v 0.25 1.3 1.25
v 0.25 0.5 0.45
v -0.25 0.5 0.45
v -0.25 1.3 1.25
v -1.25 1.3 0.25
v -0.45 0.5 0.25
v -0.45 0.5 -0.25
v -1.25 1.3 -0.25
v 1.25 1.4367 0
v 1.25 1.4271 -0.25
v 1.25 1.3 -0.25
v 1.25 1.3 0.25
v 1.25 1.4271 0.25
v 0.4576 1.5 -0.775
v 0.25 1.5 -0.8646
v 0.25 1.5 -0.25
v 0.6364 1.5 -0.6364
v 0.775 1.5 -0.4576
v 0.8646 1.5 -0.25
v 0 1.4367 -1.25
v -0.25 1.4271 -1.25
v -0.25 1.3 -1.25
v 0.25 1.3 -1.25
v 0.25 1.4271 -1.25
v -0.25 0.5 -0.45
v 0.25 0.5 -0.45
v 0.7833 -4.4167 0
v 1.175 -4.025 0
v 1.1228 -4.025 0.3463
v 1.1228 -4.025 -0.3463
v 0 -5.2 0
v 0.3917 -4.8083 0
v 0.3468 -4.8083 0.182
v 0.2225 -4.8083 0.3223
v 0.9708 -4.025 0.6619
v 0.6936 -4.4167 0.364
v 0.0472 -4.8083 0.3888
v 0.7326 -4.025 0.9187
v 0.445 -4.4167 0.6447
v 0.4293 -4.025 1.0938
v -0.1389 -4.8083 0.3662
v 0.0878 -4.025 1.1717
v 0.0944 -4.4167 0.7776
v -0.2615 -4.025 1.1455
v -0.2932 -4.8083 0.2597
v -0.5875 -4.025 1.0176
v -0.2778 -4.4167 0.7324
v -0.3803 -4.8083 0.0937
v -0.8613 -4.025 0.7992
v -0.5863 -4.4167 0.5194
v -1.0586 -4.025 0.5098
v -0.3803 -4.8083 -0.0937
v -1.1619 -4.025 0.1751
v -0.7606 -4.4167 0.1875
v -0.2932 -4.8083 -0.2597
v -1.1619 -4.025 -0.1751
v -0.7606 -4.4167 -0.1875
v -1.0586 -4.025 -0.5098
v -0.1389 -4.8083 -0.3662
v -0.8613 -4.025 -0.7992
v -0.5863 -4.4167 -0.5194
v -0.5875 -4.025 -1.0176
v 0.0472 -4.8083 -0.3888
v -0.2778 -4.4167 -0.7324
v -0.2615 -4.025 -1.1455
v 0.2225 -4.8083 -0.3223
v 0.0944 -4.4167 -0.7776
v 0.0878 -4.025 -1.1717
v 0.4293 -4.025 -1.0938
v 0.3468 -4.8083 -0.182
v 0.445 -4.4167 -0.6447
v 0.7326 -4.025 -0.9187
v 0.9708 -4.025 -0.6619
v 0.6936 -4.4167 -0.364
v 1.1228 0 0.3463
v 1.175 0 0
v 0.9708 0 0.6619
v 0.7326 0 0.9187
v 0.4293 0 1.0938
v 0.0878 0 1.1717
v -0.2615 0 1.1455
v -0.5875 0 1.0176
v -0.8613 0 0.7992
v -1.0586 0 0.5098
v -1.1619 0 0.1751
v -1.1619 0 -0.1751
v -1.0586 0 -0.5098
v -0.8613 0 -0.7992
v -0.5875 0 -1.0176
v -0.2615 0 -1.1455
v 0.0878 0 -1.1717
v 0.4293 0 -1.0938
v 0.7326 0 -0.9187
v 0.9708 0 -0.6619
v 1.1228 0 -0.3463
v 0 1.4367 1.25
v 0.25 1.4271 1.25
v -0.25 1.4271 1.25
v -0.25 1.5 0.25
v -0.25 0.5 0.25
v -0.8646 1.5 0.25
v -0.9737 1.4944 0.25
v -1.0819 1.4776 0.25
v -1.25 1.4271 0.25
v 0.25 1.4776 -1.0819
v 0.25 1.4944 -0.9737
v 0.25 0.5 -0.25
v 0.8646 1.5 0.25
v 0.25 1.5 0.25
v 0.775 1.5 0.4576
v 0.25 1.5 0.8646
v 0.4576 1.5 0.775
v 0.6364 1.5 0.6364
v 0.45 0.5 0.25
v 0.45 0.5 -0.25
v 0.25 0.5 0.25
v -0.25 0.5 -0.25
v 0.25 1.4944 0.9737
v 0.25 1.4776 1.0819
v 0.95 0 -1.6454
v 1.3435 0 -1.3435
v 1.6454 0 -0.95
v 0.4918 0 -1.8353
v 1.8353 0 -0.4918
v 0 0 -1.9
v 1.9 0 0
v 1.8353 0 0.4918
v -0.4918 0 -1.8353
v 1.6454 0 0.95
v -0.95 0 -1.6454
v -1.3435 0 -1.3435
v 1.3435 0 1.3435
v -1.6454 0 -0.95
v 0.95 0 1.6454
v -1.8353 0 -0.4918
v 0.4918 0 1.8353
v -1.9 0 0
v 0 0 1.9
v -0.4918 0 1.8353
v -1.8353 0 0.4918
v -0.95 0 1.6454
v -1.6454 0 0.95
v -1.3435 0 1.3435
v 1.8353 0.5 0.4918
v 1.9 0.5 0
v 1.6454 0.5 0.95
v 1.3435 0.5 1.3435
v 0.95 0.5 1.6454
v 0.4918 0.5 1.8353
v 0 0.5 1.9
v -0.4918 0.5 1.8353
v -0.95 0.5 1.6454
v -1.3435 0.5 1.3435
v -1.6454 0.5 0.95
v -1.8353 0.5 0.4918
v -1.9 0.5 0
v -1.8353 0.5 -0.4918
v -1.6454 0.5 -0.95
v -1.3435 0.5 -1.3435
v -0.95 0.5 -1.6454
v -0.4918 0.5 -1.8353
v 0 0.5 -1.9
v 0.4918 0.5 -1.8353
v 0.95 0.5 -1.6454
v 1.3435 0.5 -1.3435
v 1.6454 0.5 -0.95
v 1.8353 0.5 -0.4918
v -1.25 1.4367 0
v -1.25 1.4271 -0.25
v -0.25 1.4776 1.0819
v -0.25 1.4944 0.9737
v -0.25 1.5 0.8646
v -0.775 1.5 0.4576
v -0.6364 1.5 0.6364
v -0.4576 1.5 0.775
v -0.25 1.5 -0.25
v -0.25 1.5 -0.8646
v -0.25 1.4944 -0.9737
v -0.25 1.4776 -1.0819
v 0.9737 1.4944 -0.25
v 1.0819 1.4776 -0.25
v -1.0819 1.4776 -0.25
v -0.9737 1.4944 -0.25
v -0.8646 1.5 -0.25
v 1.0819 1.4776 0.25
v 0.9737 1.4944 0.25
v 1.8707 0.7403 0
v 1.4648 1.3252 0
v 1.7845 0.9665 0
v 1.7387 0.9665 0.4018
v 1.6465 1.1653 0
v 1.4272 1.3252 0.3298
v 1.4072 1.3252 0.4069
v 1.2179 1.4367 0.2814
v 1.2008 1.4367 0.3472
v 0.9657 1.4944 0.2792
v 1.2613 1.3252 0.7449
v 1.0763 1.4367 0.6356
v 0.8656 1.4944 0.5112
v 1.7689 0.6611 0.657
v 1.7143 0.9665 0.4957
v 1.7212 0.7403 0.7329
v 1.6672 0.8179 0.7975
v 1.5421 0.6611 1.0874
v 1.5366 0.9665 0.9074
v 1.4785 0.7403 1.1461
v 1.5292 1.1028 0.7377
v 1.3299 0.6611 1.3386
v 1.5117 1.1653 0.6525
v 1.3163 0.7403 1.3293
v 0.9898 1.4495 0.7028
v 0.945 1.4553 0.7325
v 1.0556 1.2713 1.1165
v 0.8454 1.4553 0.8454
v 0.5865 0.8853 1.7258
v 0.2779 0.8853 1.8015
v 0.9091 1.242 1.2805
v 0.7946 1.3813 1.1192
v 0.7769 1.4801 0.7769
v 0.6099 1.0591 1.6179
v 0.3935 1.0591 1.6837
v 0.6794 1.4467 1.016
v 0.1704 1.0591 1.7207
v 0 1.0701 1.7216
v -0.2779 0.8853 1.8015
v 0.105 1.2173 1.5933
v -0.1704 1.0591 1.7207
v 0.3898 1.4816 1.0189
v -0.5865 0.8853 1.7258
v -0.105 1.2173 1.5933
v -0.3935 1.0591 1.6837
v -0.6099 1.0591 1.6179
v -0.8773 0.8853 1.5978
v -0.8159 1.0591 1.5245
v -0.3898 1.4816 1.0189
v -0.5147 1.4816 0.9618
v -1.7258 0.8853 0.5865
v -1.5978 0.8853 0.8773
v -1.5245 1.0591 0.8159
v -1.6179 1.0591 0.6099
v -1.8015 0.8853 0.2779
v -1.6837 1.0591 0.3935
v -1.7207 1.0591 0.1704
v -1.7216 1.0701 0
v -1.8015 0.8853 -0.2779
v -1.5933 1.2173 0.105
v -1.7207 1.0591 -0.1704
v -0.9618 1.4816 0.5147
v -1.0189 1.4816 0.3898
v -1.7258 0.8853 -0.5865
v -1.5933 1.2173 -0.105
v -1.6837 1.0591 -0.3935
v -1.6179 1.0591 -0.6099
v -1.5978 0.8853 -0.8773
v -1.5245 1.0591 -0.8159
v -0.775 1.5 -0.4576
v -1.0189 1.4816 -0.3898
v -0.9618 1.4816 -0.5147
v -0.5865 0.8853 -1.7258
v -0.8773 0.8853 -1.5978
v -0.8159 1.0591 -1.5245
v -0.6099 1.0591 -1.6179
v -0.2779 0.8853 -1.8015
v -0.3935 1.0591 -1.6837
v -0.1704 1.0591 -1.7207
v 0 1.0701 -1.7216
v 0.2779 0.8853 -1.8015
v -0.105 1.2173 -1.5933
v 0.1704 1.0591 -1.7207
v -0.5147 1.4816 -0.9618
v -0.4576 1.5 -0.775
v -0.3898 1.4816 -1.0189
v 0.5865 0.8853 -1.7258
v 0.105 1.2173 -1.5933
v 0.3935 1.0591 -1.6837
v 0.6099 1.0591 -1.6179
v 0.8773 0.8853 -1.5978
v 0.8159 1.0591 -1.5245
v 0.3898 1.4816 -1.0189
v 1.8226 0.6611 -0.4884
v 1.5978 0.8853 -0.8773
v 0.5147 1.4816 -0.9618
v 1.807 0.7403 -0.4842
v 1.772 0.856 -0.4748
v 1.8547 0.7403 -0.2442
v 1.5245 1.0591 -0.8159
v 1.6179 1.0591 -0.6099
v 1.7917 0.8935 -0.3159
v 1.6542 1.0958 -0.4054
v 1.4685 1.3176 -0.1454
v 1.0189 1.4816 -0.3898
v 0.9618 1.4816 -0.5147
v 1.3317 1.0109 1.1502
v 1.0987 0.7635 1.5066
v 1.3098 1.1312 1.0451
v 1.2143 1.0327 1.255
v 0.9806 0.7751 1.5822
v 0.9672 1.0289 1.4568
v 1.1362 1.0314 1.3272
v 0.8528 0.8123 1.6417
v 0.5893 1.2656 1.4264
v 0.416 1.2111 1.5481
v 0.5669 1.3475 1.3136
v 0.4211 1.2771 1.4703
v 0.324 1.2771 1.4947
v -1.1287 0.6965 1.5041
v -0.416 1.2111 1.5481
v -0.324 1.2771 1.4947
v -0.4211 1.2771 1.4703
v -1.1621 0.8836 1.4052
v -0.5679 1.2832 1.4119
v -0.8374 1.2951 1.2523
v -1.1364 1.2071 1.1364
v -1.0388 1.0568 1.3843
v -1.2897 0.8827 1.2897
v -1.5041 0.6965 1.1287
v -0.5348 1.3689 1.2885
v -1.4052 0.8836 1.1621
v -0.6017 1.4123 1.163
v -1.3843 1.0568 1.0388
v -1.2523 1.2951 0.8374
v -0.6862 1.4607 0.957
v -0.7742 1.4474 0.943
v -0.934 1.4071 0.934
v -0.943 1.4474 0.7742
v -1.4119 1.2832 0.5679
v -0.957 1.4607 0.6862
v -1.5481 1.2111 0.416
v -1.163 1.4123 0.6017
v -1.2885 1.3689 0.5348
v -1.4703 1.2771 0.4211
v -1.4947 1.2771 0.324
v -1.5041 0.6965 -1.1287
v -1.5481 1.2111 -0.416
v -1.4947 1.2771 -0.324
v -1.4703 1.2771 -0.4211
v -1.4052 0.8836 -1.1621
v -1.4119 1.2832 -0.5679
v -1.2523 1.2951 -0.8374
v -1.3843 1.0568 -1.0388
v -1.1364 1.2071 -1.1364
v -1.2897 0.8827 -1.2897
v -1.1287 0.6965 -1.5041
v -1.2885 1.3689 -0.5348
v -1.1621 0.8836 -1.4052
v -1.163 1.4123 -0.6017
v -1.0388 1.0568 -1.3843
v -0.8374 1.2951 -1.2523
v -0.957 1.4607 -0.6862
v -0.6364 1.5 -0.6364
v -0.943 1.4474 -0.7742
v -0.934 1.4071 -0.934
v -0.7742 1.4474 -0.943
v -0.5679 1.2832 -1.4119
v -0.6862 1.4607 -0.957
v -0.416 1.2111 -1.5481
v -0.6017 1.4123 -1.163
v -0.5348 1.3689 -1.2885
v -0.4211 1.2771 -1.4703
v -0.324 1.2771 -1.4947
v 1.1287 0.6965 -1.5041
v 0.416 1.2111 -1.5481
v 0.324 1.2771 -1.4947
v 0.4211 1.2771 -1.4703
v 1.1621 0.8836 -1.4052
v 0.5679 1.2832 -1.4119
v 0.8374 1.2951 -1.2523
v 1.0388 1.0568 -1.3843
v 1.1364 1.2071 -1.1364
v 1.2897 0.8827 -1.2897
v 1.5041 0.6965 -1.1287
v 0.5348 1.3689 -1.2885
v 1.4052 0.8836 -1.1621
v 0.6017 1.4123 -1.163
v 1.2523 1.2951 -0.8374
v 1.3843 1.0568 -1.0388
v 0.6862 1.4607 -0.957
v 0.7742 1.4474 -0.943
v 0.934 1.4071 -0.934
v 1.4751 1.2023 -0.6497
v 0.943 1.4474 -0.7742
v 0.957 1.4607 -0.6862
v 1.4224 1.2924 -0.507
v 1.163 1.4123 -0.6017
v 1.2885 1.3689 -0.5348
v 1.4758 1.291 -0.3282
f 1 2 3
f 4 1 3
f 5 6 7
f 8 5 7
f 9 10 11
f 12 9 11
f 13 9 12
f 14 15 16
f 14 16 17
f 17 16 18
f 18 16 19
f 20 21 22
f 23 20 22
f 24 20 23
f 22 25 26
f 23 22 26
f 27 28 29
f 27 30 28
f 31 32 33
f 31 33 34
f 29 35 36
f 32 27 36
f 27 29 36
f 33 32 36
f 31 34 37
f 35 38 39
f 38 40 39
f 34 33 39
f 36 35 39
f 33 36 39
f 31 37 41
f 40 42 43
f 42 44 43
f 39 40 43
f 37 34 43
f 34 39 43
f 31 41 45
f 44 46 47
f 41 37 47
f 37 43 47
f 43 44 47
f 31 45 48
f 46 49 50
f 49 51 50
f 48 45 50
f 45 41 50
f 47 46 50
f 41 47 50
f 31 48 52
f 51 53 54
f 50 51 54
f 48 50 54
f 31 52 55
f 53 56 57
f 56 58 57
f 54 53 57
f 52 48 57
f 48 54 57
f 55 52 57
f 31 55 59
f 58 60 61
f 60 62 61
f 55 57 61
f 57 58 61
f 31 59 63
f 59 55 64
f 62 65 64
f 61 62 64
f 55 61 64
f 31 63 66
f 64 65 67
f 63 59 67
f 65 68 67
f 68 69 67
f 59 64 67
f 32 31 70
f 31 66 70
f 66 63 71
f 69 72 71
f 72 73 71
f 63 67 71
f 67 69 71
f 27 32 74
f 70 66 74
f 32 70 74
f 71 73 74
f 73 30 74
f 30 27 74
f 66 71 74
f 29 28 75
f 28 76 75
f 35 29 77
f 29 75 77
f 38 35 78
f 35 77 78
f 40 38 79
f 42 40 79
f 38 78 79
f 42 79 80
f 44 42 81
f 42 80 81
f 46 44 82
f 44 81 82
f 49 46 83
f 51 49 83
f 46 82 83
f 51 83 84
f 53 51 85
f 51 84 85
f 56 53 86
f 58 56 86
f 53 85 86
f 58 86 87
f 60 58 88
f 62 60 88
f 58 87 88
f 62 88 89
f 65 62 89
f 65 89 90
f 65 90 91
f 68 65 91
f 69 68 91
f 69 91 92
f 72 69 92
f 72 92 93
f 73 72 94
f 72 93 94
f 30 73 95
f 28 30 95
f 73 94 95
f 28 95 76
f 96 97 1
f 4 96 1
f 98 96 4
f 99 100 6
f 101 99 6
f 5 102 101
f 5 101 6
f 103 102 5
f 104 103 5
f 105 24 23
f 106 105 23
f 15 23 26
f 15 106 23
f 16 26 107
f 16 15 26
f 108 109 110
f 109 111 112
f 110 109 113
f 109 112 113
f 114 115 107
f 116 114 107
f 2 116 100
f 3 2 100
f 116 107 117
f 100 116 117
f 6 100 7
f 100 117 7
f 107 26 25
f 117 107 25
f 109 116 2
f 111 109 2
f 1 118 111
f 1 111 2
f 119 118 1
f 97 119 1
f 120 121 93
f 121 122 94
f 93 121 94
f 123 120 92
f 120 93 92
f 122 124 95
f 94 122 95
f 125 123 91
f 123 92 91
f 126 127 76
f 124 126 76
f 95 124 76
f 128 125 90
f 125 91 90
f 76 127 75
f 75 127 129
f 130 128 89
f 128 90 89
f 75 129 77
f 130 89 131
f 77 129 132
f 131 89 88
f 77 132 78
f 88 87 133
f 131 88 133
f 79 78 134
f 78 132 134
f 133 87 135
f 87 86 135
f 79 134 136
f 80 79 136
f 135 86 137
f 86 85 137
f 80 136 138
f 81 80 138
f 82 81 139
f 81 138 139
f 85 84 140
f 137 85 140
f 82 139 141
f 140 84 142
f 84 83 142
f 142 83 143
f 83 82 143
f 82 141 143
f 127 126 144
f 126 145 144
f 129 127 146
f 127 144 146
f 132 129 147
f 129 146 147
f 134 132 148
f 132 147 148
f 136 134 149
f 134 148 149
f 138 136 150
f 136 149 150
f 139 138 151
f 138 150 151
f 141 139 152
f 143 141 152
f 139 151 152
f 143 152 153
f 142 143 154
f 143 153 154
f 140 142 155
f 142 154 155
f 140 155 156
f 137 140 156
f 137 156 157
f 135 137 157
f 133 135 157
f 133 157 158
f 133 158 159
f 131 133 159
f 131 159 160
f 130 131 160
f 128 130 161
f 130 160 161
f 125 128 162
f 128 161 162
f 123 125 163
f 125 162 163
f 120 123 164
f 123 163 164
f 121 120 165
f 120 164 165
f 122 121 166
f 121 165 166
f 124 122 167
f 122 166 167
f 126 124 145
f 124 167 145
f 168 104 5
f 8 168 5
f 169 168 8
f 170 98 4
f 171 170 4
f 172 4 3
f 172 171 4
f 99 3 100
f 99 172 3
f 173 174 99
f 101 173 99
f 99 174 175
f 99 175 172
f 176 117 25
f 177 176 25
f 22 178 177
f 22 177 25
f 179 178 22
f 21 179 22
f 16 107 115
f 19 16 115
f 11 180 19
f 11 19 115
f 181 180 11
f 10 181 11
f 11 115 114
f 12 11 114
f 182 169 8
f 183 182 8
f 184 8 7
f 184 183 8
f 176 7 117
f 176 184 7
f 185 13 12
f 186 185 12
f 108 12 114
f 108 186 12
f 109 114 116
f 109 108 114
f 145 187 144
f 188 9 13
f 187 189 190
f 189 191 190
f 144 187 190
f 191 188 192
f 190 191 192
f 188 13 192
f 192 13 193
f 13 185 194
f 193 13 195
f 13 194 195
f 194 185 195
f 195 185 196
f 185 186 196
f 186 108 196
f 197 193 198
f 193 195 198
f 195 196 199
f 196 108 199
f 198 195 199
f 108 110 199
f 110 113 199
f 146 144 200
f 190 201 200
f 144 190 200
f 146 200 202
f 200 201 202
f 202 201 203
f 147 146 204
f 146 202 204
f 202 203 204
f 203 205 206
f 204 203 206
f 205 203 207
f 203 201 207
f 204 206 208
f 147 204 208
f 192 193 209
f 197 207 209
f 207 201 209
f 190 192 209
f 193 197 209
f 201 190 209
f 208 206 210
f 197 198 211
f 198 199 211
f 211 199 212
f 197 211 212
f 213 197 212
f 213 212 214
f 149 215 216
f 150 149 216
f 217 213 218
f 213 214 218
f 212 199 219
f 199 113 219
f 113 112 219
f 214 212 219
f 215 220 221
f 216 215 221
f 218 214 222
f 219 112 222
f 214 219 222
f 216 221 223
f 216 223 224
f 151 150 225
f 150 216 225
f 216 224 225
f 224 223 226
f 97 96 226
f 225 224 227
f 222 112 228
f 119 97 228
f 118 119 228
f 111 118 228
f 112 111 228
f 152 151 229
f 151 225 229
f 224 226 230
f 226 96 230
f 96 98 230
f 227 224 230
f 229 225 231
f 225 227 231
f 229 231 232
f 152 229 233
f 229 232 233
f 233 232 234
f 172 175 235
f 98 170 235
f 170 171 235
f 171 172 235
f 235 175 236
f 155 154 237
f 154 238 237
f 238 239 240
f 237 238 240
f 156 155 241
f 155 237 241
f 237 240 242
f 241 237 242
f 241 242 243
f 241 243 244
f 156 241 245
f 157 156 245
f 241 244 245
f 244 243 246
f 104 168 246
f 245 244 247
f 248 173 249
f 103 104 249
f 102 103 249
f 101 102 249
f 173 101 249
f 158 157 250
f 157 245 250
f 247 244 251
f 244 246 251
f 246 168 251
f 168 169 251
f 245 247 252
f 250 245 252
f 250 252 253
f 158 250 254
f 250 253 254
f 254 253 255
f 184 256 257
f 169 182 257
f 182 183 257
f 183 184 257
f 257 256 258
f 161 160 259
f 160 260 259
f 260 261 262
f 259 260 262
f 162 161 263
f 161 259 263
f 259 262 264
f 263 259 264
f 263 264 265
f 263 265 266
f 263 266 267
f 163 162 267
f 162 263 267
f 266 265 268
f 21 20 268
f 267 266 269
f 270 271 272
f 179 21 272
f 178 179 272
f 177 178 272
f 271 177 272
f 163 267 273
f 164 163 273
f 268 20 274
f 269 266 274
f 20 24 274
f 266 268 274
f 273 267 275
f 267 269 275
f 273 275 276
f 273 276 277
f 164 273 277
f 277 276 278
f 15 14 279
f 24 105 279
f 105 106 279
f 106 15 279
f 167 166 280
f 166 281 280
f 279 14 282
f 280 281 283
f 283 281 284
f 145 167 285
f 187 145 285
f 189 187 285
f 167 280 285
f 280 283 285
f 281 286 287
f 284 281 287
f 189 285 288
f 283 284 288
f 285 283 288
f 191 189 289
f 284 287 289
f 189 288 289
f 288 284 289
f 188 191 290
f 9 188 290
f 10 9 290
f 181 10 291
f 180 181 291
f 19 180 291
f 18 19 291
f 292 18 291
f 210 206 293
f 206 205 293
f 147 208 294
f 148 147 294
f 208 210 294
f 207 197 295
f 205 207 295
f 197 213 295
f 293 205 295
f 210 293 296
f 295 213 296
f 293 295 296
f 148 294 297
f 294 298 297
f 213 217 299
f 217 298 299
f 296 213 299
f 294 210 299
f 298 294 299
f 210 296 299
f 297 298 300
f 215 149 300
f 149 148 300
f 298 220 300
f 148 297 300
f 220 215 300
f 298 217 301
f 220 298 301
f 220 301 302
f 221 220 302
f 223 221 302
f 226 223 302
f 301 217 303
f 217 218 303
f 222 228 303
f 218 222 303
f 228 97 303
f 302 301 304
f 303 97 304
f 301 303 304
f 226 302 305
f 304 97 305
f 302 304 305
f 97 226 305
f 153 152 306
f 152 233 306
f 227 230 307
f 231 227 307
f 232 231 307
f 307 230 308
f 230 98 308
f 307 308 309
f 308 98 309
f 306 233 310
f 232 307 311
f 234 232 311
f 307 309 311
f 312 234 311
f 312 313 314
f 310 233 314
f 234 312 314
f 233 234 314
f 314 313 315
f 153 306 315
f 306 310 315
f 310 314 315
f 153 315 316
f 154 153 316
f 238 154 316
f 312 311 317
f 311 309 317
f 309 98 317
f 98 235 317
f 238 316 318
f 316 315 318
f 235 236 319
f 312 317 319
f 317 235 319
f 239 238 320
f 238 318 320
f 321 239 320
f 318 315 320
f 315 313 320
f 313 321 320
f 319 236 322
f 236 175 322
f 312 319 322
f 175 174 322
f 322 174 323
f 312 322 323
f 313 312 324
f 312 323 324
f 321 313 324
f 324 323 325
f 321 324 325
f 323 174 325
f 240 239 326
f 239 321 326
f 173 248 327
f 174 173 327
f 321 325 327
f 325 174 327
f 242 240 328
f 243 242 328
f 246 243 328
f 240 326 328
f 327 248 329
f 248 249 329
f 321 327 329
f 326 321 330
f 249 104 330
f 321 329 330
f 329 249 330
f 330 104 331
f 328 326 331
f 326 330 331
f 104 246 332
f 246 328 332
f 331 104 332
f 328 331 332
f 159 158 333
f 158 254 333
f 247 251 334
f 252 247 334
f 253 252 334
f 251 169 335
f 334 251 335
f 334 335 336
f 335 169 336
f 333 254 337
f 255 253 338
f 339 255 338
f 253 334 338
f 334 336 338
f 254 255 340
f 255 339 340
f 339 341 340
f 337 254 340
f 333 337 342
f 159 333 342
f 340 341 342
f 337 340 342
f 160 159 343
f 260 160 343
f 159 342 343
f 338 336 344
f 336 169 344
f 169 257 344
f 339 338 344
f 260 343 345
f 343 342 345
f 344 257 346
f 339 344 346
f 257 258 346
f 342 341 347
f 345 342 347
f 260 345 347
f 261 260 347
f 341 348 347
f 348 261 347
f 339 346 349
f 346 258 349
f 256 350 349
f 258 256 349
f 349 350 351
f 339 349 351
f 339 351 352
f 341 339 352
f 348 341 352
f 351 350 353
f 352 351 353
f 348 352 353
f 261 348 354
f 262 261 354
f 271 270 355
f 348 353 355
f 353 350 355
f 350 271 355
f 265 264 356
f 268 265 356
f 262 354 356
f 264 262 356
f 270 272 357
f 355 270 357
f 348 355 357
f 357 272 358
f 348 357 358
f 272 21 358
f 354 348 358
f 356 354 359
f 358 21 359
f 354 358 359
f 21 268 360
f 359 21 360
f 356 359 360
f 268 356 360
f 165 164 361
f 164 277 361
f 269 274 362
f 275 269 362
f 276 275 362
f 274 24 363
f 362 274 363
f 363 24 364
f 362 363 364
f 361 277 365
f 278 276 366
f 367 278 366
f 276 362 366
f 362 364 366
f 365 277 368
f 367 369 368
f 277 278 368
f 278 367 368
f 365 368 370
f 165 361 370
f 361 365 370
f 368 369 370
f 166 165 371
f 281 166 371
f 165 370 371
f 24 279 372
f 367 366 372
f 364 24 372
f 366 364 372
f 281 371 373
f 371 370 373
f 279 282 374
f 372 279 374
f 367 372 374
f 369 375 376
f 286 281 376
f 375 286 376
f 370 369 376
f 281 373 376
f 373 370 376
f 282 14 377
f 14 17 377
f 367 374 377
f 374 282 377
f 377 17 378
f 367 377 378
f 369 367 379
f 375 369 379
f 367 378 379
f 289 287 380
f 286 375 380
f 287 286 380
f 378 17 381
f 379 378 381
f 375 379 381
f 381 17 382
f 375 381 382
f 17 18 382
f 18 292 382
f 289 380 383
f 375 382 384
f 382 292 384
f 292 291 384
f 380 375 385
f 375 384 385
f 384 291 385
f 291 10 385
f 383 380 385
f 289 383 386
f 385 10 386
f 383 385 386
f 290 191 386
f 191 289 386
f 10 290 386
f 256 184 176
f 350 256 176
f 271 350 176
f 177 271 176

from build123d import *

# Parameters (mm, degrees)
CUT_EXTRUDE1_DEPTH = 1
CHAMFER1_SIZE      = 0.8


with BuildPart() as part:
    # Sketch1 → Revolve1 (revolve)
    with BuildSketch(Plane.XY):
        with BuildLine():
            Line((1.175, 0), (1.9, 0))
            Line((1.9, 0), (1.9, 0.5))
            ThreePointArc((1.9, 0.5), (1.607106781, 1.207106781), (0.9, 1.5))
            Line((0.9, 1.5), (0, 1.5))
            Line((0, 1.5), (0, -5.2))
            Line((0, -5.2), (1.175, -4.025))
            Line((1.175, -4.025), (1.175, 0))
        make_face()
    revolve(axis=Axis((0, -5.2, 0), (0, -1, 0)))

    # Sketch2 → Cut-Extrude1 (cut)
    with BuildSketch(Plane(origin=(0, 1.5, 0), x_dir=(1, 0, 0), z_dir=(0, 1, 0))):
        Polygon((0.25, 0.25), (1.25, 0.25), (1.25, -0.25), (0.25, -0.25), (0.25, -1.25), (-0.25, -1.25), (-0.25, -0.25), (-1.25, -0.25), (-1.25, 0.25), (-0.25, 0.25), (-0.25, 1.25), (0.25, 1.25), align=None)
    extrude(amount=-CUT_EXTRUDE1_DEPTH, mode=Mode.SUBTRACT)

    # Chamfer1
    chamfer1_edges = [part.edges().sort_by_distance(p)[0] for p in [
        (-1.25, 0.5, 0),
        (0, 0.5, -1.25),
        (1.25, 0.5, 0),
        (0, 0.5, 1.25),
    ]]
    chamfer(chamfer1_edges, length=CHAMFER1_SIZE)


solid = part.part
